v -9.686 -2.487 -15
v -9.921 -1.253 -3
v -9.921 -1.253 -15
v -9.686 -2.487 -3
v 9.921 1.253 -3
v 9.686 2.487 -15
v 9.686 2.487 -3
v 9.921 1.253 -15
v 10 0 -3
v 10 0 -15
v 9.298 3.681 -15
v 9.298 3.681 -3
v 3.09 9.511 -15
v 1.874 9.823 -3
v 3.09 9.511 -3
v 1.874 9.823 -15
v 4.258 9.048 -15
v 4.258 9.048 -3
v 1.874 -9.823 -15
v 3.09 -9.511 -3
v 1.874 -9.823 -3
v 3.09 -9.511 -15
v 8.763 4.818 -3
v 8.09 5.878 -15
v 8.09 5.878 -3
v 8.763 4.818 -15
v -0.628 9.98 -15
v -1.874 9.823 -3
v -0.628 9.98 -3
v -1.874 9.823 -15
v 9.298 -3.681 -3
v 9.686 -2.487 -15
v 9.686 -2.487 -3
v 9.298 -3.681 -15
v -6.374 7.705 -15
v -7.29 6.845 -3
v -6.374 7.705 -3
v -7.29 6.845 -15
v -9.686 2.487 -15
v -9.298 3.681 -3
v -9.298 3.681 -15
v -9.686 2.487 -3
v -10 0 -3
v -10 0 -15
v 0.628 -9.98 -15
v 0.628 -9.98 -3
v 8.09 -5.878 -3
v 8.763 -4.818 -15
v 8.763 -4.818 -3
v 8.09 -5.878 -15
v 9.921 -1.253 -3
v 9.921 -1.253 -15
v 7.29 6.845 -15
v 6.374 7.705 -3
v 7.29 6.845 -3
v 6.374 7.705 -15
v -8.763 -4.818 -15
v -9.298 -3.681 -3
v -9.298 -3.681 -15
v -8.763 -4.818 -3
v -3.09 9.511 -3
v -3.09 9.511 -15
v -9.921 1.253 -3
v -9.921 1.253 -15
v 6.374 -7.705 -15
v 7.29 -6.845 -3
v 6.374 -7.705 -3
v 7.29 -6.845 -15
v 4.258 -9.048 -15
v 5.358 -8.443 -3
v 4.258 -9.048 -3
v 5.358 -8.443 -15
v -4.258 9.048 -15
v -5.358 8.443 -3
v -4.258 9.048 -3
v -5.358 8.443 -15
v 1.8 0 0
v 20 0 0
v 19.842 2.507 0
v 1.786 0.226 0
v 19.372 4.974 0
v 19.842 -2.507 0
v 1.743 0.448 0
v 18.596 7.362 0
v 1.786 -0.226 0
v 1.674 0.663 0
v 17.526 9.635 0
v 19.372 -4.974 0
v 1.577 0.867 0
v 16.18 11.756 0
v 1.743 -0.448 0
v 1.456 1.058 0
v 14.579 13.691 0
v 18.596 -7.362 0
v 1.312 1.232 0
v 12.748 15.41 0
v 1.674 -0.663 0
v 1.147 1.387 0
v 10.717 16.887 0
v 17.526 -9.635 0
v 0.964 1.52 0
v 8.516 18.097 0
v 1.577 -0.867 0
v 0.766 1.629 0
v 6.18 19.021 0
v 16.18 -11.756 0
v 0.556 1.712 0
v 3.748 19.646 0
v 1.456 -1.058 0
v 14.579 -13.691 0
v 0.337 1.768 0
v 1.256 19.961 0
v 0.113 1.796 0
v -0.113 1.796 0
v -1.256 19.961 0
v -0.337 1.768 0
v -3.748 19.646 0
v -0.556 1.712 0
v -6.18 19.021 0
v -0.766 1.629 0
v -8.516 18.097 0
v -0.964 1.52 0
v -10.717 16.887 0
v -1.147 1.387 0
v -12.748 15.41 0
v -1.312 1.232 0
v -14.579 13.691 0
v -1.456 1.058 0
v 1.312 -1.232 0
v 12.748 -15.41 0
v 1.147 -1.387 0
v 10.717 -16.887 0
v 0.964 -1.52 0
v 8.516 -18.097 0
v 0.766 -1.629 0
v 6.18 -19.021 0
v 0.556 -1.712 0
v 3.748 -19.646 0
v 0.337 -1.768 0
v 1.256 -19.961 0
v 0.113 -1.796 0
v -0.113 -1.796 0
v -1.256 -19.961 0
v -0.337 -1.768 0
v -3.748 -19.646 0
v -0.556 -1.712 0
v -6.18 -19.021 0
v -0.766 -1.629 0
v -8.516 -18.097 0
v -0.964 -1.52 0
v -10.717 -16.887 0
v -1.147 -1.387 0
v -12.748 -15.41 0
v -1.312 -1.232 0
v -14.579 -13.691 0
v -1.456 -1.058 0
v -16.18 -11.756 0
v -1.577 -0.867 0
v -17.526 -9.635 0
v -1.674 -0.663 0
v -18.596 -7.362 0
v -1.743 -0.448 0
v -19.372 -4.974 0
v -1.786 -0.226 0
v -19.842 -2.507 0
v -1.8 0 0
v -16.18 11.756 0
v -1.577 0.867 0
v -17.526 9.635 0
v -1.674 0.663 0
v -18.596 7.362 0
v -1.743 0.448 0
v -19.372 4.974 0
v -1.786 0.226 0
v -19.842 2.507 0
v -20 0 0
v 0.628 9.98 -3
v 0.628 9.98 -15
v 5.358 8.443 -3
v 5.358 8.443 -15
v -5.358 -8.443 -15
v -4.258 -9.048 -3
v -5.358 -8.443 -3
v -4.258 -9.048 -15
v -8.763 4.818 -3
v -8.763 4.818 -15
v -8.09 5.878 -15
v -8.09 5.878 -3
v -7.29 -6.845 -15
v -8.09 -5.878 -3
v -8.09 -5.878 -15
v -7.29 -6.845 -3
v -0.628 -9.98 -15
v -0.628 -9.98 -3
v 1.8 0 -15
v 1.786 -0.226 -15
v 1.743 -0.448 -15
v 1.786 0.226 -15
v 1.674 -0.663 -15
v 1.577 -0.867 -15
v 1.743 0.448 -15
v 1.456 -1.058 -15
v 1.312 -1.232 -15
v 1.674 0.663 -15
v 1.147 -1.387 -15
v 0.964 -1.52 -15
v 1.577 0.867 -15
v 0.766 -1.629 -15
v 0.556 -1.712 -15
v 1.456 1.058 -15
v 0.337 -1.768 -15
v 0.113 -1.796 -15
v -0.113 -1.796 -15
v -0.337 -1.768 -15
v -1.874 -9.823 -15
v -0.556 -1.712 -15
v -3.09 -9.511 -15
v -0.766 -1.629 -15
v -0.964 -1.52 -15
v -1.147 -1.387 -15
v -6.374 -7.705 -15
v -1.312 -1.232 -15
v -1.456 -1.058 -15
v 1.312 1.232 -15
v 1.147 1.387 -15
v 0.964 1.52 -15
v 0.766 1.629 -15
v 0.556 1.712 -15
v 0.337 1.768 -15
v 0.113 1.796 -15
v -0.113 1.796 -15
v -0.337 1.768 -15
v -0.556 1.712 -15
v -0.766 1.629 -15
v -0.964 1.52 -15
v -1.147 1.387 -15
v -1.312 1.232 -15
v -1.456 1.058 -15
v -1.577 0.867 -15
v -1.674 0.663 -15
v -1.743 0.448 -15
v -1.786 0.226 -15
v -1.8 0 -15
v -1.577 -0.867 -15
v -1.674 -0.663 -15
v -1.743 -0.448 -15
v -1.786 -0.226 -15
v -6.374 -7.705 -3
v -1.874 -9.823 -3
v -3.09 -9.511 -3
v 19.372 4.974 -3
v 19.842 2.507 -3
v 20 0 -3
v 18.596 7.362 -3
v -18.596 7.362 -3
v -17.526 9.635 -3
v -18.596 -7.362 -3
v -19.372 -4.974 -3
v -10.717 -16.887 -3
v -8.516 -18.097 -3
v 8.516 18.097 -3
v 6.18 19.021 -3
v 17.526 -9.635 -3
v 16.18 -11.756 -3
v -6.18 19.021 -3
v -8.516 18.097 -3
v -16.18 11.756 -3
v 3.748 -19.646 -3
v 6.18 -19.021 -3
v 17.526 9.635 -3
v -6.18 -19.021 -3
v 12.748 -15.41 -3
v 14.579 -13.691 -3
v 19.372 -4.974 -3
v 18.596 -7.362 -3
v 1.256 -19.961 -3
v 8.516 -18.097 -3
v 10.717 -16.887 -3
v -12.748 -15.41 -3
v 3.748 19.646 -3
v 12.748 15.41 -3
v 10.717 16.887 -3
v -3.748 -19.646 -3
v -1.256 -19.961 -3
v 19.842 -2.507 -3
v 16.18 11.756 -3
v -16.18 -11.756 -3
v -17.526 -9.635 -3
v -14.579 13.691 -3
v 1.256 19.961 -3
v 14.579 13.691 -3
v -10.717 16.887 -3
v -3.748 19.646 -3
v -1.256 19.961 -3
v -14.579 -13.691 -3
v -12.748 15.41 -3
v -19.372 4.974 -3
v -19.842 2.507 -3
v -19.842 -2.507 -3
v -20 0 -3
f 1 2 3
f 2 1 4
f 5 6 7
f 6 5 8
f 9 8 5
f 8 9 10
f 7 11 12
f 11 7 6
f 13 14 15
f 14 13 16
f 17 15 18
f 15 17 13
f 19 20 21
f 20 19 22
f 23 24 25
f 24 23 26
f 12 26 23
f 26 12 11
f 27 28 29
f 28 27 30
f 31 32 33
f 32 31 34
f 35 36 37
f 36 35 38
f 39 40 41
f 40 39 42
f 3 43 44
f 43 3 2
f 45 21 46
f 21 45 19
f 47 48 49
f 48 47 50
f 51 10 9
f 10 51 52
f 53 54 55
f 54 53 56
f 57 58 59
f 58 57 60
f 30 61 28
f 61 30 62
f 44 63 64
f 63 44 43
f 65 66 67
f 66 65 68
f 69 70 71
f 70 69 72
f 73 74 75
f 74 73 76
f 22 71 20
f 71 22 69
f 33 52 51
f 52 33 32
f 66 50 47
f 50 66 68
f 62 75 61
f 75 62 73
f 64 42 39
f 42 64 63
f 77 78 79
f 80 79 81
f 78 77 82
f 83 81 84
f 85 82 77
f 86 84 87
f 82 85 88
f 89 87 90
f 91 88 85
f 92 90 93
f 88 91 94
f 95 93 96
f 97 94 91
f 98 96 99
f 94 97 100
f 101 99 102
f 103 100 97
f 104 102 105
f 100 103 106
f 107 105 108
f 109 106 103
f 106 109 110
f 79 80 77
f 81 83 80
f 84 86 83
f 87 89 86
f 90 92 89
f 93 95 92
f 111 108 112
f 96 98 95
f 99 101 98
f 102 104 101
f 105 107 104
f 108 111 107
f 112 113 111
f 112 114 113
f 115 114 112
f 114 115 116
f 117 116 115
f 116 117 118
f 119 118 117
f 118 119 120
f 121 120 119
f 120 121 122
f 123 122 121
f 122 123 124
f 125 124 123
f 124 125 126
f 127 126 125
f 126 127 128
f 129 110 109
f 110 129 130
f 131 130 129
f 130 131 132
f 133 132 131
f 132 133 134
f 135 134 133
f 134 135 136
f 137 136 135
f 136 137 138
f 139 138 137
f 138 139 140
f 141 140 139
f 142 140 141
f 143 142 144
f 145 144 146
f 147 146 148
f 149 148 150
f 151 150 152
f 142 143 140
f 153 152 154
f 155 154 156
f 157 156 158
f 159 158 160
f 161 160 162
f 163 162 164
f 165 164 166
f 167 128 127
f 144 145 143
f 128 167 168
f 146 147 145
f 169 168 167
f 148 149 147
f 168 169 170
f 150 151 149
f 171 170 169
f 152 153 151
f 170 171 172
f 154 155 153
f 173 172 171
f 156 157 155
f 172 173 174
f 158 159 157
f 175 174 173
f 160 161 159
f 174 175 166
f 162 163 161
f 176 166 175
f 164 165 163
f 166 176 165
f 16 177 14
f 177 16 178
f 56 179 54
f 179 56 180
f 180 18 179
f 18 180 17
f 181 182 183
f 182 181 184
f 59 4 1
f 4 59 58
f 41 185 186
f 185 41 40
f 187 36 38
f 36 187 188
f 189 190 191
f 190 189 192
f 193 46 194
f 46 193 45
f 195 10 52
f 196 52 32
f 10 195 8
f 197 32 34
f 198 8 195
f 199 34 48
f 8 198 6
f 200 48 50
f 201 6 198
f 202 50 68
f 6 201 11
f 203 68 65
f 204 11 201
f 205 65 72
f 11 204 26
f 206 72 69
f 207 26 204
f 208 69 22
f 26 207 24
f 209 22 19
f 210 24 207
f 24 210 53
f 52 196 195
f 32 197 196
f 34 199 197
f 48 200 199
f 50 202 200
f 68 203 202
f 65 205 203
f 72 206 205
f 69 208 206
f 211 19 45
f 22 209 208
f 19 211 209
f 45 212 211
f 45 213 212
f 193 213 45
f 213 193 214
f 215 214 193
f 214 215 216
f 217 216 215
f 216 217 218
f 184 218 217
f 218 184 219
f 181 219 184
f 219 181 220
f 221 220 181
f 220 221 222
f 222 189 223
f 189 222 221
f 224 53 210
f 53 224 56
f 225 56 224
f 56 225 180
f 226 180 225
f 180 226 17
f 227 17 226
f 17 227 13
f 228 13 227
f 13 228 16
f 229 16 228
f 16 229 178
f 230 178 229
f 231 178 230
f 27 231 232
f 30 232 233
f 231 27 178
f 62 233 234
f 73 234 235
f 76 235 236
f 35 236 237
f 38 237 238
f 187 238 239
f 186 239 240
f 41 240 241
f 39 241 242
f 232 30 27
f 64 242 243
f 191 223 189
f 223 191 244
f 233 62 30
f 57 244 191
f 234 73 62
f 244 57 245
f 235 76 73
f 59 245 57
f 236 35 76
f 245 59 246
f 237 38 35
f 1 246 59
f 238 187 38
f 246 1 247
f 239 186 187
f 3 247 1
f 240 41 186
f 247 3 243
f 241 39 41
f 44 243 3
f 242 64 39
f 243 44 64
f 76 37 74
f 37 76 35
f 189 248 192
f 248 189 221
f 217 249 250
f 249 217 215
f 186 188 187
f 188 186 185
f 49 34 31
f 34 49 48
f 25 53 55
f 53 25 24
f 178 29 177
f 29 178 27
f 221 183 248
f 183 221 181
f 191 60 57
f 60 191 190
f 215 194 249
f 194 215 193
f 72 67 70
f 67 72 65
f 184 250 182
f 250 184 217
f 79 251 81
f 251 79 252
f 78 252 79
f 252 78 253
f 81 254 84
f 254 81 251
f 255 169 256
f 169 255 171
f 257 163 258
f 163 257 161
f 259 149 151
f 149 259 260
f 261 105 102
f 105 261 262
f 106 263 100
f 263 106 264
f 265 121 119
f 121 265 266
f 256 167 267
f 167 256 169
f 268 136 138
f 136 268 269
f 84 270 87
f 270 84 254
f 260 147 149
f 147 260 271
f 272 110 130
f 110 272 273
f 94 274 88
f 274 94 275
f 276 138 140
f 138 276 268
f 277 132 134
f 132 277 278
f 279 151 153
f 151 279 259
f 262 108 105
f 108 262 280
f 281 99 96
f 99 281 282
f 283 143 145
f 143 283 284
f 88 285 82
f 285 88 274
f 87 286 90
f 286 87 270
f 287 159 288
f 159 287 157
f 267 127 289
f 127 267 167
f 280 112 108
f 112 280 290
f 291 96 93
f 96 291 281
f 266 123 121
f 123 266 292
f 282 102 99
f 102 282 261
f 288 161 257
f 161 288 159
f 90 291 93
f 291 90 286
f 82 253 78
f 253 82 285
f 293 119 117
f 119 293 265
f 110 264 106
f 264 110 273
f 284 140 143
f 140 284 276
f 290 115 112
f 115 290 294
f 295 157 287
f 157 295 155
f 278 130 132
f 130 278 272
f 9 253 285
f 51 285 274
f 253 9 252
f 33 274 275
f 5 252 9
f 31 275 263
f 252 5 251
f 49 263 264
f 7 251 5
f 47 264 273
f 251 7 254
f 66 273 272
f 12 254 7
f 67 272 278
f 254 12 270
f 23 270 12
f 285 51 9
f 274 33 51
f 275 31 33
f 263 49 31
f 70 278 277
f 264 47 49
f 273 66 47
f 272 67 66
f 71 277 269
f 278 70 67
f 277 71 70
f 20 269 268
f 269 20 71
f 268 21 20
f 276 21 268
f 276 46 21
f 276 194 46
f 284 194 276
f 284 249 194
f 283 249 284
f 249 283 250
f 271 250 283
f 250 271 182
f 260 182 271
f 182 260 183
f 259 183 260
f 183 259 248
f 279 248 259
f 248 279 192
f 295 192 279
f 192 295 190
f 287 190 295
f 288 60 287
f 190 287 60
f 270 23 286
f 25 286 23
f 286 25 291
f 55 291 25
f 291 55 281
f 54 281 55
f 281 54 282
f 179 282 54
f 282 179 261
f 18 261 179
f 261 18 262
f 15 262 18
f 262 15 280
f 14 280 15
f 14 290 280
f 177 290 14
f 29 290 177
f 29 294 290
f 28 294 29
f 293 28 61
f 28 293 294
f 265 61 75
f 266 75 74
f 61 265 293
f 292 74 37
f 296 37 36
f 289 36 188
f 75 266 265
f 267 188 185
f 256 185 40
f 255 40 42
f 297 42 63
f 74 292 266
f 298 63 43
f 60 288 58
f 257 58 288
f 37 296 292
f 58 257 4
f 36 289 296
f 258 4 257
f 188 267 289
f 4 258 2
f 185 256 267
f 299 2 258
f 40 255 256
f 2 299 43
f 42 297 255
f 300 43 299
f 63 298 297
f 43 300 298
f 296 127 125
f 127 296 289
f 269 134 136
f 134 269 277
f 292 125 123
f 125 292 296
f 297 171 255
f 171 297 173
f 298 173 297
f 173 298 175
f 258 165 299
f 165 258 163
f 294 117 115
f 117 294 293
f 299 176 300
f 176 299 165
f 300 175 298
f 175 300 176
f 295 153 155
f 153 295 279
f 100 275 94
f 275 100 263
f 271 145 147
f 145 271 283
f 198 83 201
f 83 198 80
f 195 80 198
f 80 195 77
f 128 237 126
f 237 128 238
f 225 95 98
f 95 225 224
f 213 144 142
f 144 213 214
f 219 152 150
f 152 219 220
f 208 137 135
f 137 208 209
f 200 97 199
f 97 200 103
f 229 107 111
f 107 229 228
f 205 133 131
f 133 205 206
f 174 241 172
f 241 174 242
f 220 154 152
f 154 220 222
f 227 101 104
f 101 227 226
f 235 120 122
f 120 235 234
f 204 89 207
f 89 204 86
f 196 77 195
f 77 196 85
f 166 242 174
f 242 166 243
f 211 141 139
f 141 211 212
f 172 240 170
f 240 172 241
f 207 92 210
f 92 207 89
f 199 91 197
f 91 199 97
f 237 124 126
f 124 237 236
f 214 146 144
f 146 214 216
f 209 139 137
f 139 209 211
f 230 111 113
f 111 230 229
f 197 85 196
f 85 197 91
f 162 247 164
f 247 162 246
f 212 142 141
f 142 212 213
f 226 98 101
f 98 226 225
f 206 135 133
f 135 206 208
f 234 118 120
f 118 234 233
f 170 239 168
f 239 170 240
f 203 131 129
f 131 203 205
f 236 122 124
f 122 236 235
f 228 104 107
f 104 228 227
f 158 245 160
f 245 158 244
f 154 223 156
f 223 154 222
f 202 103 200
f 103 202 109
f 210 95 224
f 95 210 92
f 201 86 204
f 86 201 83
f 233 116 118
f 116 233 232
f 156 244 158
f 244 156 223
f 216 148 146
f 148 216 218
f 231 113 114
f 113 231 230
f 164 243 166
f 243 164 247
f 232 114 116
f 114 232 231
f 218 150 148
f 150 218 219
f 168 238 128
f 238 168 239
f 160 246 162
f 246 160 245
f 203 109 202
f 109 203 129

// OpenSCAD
$fn = 50;


difference() {
	union() {
		translate(v = [0, 0, -15.0000000000]) {
			cylinder(h = 15, r = 10.0000000000);
		}
		translate(v = [0, 0, -3.0000000000]) {
			cylinder(h = 3, r = 20.0000000000);
		}
	}
	union() {
		#translate(v = [0, 0, -15]) {
			cylinder(h = 15, r = 1.8000000000);
		}
	}
}
